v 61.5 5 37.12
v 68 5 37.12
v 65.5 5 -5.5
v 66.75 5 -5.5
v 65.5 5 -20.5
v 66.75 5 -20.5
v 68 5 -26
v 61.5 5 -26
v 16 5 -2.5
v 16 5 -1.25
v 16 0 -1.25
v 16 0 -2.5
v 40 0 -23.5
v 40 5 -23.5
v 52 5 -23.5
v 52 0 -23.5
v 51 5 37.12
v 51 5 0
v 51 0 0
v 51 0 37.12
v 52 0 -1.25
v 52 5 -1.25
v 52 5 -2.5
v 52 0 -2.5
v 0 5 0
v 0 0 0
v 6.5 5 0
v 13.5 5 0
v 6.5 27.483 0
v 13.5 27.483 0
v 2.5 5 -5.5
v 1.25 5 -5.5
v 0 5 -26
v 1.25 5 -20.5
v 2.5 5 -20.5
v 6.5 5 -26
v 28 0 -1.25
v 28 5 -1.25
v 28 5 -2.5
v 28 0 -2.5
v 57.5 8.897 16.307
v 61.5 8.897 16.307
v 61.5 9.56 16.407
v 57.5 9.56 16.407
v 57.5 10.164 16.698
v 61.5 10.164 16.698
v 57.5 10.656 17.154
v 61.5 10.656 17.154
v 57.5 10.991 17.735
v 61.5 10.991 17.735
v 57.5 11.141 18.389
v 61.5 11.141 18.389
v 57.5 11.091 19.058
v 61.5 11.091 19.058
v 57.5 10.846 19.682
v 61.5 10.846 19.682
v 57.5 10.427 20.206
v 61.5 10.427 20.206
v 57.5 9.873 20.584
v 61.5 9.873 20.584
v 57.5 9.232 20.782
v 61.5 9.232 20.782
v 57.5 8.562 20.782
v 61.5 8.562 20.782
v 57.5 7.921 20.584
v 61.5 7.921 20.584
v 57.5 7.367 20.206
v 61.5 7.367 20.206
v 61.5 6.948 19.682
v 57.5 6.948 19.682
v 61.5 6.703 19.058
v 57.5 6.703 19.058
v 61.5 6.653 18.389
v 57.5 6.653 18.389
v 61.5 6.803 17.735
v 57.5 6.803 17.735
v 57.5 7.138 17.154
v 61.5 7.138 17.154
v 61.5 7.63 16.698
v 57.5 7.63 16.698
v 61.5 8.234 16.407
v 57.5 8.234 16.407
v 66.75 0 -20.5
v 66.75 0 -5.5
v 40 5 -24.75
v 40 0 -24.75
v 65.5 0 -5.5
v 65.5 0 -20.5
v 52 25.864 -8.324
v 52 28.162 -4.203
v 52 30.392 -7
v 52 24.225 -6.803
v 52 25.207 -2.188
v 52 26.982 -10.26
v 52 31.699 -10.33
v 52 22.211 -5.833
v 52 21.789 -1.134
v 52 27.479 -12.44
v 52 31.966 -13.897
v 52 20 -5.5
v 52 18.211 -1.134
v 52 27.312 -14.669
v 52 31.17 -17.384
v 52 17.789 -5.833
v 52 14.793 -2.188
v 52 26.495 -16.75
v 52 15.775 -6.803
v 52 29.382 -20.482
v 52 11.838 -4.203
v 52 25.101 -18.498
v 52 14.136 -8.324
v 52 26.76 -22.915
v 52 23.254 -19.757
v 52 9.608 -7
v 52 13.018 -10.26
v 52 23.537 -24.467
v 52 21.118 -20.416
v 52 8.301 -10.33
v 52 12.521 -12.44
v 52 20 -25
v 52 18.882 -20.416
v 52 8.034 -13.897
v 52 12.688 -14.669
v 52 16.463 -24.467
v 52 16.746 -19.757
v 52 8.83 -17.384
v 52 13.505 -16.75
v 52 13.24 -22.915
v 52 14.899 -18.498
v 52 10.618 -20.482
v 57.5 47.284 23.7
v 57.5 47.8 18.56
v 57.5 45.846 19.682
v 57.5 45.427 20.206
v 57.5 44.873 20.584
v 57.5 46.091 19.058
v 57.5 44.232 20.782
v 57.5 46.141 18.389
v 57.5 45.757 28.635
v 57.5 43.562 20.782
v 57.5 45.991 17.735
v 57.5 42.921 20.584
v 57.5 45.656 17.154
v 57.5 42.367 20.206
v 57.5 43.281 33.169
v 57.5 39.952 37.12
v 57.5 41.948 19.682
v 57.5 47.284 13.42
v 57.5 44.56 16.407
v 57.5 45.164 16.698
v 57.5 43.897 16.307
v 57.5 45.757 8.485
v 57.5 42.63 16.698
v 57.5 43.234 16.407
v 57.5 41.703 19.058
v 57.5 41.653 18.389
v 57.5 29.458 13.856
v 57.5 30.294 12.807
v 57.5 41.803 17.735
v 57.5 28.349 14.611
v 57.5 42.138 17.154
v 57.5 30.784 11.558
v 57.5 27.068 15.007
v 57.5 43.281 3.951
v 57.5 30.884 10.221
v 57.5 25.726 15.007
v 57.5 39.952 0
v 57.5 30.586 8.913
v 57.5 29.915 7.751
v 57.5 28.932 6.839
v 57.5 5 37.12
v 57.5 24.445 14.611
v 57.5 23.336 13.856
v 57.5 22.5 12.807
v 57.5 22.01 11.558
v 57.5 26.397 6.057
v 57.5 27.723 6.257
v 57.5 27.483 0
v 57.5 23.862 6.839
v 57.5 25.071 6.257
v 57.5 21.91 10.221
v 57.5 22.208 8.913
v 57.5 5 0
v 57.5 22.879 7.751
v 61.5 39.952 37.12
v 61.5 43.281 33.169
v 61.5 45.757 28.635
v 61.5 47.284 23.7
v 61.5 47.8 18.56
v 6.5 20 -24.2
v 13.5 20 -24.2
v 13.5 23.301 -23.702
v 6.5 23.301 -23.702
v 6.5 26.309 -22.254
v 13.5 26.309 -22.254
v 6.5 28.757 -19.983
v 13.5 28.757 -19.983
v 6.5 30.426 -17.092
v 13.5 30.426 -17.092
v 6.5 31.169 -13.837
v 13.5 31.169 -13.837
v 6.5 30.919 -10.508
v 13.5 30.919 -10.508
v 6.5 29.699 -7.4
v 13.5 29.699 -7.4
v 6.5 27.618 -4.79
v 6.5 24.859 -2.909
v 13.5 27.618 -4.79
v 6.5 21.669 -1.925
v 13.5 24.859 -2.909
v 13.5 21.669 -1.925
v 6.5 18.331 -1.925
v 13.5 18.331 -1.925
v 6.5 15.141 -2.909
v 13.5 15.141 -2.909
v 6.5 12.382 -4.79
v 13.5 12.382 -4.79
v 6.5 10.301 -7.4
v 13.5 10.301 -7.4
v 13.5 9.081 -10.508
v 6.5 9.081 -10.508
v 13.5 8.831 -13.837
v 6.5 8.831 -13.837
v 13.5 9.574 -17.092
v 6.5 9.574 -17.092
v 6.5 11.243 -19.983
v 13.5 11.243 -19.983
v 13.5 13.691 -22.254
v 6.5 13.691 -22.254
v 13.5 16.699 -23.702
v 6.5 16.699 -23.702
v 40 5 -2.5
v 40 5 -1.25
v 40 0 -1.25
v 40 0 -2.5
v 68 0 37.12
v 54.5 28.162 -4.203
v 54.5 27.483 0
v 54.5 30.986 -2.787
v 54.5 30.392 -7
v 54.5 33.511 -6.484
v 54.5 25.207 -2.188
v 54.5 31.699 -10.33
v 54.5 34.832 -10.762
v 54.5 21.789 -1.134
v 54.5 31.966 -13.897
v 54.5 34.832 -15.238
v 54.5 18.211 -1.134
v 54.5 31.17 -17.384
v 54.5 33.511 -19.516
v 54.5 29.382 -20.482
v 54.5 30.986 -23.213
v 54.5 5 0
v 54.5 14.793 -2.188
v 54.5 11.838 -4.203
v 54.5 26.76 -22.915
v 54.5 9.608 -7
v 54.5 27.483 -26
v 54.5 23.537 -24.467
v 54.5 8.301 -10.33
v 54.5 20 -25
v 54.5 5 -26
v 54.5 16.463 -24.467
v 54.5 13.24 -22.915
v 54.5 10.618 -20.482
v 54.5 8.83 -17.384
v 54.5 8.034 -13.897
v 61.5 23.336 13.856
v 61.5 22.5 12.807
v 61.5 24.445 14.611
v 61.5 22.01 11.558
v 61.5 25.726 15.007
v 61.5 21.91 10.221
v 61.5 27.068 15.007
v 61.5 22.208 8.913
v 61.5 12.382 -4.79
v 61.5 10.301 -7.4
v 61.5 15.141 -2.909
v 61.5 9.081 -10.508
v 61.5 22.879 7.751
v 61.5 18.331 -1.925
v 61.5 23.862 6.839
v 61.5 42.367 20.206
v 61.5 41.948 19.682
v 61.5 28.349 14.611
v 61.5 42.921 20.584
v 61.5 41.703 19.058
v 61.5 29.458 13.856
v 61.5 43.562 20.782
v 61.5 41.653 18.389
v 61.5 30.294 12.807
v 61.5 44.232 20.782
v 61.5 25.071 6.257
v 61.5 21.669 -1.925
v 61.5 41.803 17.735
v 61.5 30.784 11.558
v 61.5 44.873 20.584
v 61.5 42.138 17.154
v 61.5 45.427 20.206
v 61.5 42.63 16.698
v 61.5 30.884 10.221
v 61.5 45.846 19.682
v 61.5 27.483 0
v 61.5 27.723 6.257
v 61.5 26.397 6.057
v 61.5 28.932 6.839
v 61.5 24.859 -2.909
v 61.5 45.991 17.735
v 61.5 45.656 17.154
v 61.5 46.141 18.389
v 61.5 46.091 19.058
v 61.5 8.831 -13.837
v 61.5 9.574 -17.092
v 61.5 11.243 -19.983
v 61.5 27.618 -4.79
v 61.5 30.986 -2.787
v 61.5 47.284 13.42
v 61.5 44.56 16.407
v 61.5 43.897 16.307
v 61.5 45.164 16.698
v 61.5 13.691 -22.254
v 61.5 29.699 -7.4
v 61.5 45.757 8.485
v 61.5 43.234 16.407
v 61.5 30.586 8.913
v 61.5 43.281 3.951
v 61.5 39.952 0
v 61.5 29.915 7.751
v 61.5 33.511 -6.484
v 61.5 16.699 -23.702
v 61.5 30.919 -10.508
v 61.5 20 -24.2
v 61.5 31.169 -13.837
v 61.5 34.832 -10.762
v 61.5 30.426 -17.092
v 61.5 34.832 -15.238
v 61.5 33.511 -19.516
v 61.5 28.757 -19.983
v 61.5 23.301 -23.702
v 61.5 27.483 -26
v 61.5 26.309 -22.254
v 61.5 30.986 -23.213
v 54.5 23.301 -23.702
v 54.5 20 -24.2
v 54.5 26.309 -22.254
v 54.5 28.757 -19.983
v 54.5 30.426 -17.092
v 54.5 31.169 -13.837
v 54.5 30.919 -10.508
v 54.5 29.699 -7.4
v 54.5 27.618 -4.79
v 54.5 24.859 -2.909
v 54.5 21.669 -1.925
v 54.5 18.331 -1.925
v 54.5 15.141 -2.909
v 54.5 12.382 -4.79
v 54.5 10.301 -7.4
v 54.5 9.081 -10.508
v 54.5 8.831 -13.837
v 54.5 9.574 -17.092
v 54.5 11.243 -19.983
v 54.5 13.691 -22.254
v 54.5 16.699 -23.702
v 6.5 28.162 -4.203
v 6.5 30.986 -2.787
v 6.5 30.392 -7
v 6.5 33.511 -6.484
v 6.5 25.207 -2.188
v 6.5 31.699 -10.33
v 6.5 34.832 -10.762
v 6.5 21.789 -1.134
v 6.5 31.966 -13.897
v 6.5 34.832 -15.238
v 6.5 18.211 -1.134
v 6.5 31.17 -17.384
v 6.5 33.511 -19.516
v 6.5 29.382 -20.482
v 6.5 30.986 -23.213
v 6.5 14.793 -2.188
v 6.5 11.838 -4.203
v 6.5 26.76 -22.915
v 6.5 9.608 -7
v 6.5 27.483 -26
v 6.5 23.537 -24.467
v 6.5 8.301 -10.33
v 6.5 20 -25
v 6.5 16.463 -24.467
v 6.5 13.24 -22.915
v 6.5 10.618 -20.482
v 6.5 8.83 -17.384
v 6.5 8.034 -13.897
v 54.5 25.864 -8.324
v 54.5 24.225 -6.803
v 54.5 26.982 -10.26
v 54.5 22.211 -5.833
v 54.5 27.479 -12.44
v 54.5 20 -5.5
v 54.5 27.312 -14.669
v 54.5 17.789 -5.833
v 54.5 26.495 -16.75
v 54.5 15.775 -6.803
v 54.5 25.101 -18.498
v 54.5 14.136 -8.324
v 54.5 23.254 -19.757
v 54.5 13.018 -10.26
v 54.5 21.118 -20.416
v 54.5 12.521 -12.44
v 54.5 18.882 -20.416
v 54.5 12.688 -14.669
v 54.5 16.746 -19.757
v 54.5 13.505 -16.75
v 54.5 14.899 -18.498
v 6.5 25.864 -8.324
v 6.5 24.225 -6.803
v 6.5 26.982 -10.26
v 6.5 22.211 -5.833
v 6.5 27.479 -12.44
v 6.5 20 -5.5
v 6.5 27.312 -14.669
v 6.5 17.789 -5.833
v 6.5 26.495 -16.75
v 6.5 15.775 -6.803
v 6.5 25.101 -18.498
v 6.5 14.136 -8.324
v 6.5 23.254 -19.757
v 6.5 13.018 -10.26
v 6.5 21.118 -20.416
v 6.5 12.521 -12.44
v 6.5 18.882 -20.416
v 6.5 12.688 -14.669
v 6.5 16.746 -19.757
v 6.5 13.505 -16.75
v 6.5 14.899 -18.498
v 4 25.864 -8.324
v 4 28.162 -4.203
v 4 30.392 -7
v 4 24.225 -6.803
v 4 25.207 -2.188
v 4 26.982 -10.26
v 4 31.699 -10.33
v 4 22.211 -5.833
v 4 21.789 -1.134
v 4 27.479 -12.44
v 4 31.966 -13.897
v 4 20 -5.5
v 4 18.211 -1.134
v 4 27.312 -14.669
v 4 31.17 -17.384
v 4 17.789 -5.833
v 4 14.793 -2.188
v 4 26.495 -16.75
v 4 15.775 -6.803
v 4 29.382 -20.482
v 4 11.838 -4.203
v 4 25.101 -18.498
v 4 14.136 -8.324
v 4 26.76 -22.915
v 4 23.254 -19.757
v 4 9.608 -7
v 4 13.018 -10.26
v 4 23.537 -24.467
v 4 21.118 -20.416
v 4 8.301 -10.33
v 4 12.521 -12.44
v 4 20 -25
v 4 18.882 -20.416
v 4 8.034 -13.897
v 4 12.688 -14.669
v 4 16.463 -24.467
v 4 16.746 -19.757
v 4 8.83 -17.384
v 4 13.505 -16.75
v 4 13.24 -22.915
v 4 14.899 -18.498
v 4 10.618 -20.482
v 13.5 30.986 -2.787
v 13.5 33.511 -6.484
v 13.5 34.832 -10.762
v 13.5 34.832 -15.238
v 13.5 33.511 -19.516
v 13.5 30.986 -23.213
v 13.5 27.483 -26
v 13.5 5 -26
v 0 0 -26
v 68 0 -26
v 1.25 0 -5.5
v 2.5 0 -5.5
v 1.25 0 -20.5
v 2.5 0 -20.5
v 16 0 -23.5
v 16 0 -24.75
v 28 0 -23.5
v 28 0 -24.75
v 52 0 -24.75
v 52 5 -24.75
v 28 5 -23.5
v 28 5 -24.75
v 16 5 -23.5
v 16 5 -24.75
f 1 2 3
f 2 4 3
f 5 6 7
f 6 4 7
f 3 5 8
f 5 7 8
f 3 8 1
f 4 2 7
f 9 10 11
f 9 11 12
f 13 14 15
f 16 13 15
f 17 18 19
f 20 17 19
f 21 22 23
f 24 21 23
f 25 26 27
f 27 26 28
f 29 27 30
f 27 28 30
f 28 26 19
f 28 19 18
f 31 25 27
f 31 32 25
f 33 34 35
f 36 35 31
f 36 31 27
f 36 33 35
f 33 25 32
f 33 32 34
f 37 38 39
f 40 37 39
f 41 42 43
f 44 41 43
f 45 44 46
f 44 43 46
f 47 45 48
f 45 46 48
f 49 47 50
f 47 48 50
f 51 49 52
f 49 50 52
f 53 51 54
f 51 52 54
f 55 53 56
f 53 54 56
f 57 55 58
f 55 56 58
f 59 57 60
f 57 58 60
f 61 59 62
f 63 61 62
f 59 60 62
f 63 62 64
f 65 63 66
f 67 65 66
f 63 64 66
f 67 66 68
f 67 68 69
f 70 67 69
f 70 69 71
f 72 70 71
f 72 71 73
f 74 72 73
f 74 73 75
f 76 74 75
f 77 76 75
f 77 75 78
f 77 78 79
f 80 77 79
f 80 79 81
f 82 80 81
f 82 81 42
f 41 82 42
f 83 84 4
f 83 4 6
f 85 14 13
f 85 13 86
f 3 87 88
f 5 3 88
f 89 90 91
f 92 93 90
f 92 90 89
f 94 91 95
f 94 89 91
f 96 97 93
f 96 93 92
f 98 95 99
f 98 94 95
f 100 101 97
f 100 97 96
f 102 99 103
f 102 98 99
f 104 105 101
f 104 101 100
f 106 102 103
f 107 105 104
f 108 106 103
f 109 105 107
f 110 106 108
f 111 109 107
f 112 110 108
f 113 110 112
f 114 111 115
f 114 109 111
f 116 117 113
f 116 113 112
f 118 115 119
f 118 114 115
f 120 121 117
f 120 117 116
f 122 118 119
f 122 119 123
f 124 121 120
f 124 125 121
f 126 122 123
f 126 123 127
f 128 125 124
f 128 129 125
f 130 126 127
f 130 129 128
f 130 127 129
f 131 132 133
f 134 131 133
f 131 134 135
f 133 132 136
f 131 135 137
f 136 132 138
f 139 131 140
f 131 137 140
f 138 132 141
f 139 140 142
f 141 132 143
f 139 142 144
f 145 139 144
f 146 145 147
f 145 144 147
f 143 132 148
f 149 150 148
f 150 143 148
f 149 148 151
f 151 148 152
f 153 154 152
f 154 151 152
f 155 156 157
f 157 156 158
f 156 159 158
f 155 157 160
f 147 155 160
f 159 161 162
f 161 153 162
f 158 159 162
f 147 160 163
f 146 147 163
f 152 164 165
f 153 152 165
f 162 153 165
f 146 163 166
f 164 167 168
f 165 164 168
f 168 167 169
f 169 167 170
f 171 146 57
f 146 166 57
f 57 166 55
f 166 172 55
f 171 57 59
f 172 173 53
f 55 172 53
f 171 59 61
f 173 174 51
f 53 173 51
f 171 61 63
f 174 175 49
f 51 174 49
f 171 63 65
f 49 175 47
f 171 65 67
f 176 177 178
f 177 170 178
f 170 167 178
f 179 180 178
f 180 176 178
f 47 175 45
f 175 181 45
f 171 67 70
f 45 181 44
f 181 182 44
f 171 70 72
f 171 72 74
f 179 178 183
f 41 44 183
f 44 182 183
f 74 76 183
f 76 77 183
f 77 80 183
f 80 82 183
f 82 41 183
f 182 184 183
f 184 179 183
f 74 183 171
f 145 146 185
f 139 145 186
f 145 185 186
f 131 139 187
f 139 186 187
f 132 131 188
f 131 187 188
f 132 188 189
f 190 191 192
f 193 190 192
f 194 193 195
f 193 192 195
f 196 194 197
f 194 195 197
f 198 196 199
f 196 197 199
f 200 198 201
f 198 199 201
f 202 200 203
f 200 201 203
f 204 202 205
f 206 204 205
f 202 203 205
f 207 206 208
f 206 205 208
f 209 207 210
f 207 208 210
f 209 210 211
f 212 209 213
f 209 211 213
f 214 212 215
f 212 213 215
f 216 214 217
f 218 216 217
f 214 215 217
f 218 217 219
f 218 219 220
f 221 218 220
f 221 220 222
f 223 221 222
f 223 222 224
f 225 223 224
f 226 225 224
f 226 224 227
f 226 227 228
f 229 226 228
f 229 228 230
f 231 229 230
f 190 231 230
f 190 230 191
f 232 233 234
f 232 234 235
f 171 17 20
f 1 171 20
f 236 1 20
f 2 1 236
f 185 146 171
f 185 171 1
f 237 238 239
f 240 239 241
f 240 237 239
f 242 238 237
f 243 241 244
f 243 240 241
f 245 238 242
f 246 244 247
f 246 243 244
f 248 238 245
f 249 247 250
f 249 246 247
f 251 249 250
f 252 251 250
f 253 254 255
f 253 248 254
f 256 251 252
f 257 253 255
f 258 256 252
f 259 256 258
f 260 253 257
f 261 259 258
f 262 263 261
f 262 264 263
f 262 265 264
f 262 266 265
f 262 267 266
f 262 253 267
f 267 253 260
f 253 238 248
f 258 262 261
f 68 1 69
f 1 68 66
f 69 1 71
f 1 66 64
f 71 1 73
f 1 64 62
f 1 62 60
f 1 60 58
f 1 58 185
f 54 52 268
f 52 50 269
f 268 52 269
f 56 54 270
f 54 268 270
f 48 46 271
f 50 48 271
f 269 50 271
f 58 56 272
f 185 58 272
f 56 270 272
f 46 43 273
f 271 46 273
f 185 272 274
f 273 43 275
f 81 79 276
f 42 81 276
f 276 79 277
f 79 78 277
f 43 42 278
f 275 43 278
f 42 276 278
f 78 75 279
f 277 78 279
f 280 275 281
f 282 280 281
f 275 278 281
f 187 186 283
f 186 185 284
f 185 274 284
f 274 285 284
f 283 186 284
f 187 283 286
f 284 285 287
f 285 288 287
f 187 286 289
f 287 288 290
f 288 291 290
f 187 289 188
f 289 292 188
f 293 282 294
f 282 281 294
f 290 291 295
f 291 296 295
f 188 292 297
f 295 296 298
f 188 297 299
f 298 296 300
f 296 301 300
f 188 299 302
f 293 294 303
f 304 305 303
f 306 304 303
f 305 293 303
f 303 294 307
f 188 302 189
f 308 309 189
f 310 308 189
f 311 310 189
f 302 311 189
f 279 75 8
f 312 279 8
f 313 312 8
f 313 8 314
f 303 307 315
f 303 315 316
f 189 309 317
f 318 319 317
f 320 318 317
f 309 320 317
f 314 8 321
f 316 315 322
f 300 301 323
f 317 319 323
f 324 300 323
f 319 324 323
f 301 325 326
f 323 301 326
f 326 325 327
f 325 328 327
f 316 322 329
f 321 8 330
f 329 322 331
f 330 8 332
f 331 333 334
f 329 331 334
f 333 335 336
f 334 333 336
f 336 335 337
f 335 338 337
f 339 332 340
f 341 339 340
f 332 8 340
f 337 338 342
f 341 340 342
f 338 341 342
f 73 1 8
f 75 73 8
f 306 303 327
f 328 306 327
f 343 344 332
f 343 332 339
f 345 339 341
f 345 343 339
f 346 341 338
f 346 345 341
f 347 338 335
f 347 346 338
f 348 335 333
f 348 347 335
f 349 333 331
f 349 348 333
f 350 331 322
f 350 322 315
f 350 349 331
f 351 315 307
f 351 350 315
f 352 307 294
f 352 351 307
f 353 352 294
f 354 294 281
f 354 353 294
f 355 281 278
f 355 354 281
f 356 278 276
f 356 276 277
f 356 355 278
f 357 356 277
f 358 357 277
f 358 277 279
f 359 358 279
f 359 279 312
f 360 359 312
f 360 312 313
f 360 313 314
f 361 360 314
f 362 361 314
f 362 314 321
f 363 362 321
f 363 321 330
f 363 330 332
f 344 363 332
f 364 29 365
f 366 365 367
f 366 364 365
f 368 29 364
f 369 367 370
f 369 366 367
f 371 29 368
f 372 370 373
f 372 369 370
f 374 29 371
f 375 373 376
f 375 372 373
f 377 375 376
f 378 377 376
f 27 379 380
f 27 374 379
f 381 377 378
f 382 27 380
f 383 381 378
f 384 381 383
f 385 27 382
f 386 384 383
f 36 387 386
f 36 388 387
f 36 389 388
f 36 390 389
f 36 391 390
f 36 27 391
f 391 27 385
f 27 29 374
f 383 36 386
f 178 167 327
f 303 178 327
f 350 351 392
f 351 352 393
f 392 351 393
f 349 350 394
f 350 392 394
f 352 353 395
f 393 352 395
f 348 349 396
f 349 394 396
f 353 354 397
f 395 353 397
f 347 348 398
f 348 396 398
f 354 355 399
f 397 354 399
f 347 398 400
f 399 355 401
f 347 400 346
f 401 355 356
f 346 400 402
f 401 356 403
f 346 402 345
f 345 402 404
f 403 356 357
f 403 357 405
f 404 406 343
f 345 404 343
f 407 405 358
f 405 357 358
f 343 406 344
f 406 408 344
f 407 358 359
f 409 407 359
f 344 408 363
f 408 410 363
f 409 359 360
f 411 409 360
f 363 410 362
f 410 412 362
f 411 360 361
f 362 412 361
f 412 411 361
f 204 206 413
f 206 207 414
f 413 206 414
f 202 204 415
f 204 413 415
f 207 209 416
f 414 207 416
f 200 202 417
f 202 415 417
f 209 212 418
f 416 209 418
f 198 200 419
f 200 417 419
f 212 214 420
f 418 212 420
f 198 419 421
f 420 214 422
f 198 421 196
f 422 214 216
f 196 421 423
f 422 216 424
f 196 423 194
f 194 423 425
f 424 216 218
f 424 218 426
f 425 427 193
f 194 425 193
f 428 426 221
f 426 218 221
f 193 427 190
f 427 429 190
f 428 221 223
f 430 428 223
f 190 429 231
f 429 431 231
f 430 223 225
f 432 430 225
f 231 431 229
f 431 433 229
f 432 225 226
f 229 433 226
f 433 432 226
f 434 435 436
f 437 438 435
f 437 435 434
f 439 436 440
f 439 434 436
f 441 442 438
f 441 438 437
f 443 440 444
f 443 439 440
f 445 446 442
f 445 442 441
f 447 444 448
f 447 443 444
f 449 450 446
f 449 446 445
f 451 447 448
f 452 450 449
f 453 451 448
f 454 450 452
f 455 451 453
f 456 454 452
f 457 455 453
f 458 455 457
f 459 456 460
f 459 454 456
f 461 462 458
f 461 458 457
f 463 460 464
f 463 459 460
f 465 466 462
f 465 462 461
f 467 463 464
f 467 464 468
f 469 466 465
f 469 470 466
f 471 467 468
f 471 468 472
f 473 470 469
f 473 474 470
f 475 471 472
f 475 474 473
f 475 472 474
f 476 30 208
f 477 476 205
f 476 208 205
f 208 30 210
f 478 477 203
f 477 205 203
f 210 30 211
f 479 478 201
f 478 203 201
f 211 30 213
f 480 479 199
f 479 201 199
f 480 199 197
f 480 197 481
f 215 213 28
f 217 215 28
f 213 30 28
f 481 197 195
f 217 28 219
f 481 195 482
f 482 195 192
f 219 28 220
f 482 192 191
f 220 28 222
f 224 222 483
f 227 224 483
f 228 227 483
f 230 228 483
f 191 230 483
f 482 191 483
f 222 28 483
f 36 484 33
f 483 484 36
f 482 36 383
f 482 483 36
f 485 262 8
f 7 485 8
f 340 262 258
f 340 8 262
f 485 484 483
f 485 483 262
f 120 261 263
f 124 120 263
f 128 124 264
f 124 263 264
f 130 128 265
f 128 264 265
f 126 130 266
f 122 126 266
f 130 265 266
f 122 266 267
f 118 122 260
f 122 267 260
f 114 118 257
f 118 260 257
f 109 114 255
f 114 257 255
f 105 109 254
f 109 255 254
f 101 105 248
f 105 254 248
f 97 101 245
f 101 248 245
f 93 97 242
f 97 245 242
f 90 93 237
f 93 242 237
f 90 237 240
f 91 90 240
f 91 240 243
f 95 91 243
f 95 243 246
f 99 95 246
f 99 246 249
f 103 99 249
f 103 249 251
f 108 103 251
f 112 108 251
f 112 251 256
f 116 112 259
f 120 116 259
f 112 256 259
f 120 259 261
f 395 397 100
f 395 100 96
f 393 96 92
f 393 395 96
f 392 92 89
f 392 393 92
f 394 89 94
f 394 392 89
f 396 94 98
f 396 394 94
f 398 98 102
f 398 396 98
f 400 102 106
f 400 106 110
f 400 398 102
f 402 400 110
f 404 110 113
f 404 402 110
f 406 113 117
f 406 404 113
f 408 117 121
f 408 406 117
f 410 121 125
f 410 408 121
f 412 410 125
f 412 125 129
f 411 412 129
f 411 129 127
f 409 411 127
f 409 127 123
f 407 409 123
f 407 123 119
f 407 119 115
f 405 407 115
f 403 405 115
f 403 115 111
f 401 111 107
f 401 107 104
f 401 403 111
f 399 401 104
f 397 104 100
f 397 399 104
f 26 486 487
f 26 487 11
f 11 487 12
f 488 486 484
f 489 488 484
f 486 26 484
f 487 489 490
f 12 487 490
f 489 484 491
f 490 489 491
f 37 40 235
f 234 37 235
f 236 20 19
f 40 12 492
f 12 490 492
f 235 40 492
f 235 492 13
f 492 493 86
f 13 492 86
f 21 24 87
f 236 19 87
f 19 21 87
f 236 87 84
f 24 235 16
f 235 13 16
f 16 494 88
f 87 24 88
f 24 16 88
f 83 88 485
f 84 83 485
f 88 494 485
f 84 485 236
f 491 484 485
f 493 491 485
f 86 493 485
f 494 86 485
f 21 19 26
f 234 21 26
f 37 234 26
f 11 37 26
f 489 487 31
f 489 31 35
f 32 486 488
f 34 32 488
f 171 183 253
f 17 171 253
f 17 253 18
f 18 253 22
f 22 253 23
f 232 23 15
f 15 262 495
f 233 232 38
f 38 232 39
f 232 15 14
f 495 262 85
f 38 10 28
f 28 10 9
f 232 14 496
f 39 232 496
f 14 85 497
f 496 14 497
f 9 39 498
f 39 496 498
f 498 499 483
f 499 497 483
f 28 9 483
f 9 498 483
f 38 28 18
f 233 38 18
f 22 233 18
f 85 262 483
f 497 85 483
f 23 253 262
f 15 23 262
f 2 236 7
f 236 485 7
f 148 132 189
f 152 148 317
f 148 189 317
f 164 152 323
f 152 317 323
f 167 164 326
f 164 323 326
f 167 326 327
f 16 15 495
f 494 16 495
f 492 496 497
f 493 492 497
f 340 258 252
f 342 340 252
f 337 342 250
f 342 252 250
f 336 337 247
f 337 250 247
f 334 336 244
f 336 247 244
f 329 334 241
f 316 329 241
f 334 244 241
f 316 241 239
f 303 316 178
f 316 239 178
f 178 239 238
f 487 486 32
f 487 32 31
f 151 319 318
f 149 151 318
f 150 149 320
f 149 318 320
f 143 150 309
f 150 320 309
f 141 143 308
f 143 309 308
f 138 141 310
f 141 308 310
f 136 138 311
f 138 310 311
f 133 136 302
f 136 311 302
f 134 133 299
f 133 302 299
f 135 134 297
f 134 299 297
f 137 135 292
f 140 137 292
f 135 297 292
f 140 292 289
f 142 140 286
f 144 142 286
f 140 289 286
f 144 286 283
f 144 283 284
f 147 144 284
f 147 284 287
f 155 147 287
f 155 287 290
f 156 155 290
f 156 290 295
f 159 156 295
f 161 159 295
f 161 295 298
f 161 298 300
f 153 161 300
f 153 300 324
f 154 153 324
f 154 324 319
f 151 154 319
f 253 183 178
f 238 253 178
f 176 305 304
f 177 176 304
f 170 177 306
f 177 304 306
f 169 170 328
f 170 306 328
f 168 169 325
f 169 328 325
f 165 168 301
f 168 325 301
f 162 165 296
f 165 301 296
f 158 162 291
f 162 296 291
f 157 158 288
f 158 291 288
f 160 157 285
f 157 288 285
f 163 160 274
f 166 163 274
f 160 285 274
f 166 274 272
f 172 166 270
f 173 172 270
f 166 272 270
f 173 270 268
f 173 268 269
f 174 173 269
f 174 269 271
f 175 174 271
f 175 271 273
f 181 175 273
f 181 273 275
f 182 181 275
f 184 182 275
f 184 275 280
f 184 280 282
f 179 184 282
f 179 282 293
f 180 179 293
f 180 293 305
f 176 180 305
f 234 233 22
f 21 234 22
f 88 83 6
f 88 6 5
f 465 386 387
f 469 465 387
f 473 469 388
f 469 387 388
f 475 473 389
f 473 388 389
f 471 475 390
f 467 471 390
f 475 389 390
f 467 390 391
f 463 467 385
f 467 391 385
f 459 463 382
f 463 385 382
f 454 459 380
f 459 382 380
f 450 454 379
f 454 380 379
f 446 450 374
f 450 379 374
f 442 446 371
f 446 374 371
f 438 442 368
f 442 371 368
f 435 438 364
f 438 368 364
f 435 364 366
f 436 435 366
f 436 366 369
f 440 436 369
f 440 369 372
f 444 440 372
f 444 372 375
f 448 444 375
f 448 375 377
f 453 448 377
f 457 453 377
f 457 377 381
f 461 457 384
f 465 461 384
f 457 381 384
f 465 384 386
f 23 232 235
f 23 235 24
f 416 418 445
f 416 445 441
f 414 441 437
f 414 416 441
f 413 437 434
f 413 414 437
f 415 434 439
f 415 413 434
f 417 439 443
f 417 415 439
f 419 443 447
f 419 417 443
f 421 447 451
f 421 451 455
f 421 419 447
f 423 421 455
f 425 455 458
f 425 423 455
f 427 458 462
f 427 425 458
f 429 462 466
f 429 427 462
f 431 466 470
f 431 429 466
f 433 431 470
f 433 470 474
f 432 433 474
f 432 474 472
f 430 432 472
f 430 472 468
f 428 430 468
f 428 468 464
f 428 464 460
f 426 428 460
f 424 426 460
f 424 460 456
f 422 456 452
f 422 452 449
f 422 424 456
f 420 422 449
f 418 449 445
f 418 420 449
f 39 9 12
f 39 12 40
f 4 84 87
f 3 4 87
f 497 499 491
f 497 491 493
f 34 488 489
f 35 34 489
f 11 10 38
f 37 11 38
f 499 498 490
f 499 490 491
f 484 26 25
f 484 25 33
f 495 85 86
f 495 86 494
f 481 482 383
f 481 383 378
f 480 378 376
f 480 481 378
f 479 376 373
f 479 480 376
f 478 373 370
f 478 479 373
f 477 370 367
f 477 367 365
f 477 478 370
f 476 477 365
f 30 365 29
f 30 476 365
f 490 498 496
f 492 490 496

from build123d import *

# Parameters (mm, degrees)
SKETCH1_W            = 20
SKETCH1_H            = 26
SKETCH1_W_2          = 1.25
SKETCH1_H_2          = 15
BOSS_EXTRUDE5_DEPTH  = 5
SKETCH3_W            = 7
SKETCH3_H            = 26
BOSS_EXTRUDE6_DEPTH  = 40
CUT_EXTRUDE1_REACH   = 55.696
SKETCH5_R            = 11.2
SKETCH6_W            = 26
SKETCH6_H            = 5
BOSS_EXTRUDE8_DEPTH  = 14
SKETCH8_R            = 12
SKETCH8_R_2          = 7.5
BOSS_EXTRUDE9_DEPTH  = 2.5
SKETCH9_R            = 12
SKETCH9_R_2          = 7.5
BOSS_EXTRUDE10_DEPTH = 2.5
SKETCH7_W            = 12
SKETCH7_H            = 1.25
CUT_EXTRUDE2_DEPTH   = 10
BOSS_EXTRUDE11_DEPTH = 37.12
SKETCH14_R           = 2.25
SKETCH14_R_2         = 4.5
CUT_EXTRUDE4_DEPTH   = 10


with BuildPart() as part:
    # Sketch1 → Boss-Extrude5 (new body)
    with BuildSketch(Plane(origin=(0, 0, 0), x_dir=(1, 0, 0), z_dir=(0, 1, 0))):
        with Locations((10, 13)):
            Rectangle(SKETCH1_W, SKETCH1_H)
        with Locations((1.875, 13)):
            Rectangle(SKETCH1_W_2, SKETCH1_H_2, mode=Mode.SUBTRACT)
    boss_extrude5 = extrude(amount=BOSS_EXTRUDE5_DEPTH)

    # Sketch3 → Boss-Extrude6 (add)
    with BuildSketch(Plane(origin=(0, 5, 0), x_dir=(1, 0, 0), z_dir=(0, 1, 0))):
        with Locations((10, 13)):
            Rectangle(SKETCH3_W, SKETCH3_H)
    boss_extrude6 = extrude(amount=BOSS_EXTRUDE6_DEPTH)

    # Sketch5 → Cut-Extrude1 (cut, up to next)
    with BuildSketch(Plane(origin=(13.5, 0, 0), x_dir=(0, 0, -1), z_dir=(1, 0, 0)), mode=Mode.PRIVATE) as cut_extrude1_sk1:
        with Locations((13, 20)):
            Circle(SKETCH5_R)
    cut_extrude1_tool1 = extrude(cut_extrude1_sk1.sketch, amount=-CUT_EXTRUDE1_REACH, mode=Mode.PRIVATE) & part.part
    # Sketch5 → Cut-Extrude1 (cut, up to next)
    with BuildSketch(Plane(origin=(13.5, 0, 0), x_dir=(0, 0, -1), z_dir=(1, 0, 0)), mode=Mode.PRIVATE) as cut_extrude1_sk2:
        with BuildLine():
            Line((0, 27.483314774), (0, 45))
            Line((0, 45), (26, 45))
            Line((26, 45), (26, 27.483314774))
            ThreePointArc((26, 27.483314774), (13, 35), (0, 27.483314774))
        make_face()
    cut_extrude1_tool2 = extrude(cut_extrude1_sk2.sketch, amount=-CUT_EXTRUDE1_REACH, mode=Mode.PRIVATE) & part.part
    cut_extrude1_1 = cut_extrude1_tool1.solids().sort_by_distance((13.5, 20, -13))[0]
    add(cut_extrude1_1, mode=Mode.SUBTRACT)
    cut_extrude1_2 = cut_extrude1_tool2.solids().sort_by_distance((13.5, 38.725293, -13))[0]
    add(cut_extrude1_2, mode=Mode.SUBTRACT)
    cut_extrude1 = cut_extrude1_1 + cut_extrude1_2  # Cut-Extrude1 as one shape, for the pattern or mirror that repeats it

    # Sketch6 → Boss-Extrude8 (add)
    with BuildSketch(Plane(origin=(20, 0, 0), x_dir=(0, 0, -1), z_dir=(1, 0, 0))):
        with Locations((13, 2.5)):
            Rectangle(SKETCH6_W, SKETCH6_H)
    boss_extrude8 = extrude(amount=BOSS_EXTRUDE8_DEPTH)

    # Mirror5: Boss-Extrude5, Boss-Extrude6, Cut-Extrude1, Boss-Extrude8 across plane
    add(boss_extrude5.mirror(Plane.ZY.offset(-34)))
    add(boss_extrude6.mirror(Plane.ZY.offset(-34)))
    add(cut_extrude1.mirror(Plane.ZY.offset(-34)), mode=Mode.SUBTRACT)
    add(boss_extrude8.mirror(Plane.ZY.offset(-34)))

    # Sketch8 → Boss-Extrude9 (add)
    with BuildSketch(Plane.ZY.offset(-6.5)):
        with Locations(Location((-13, 20, 0), (0, 0, 180))):
            Circle(SKETCH8_R)
        with Locations((-13, 20)):
            Circle(SKETCH8_R_2, mode=Mode.SUBTRACT)
    extrude(amount=BOSS_EXTRUDE9_DEPTH)

    # Sketch9 → Boss-Extrude10 (add)
    with BuildSketch(Plane.ZY.offset(-54.5)):
        with Locations(Location((-13, 20, 0), (0, 0, 180))):
            Circle(SKETCH9_R)
        with Locations((-13, 20)):
            Circle(SKETCH9_R_2, mode=Mode.SUBTRACT)
    extrude(amount=BOSS_EXTRUDE10_DEPTH)

    # Sketch7 → Cut-Extrude2 (cut)
    with BuildSketch(Plane(origin=(0, 5, 0), x_dir=(1, 0, 0), z_dir=(0, 1, 0))):
        with Locations((22, 1.875)):
            Rectangle(SKETCH7_W, SKETCH7_H)
        with Locations((46, 1.875)):
            Rectangle(SKETCH7_W, SKETCH7_H)
        with Locations((46, 24.125)):
            Rectangle(SKETCH7_W, SKETCH7_H)
        with Locations((22, 24.125)):
            Rectangle(SKETCH7_W, SKETCH7_H)
    extrude(amount=-CUT_EXTRUDE2_DEPTH, mode=Mode.SUBTRACT)

    # Sketch10 → Boss-Extrude11 (add)
    with BuildSketch(Plane.XY):
        Polygon((51, 0), (68, 0), (68, 5), (61.5, 5), (61.5, 47.8), (57.5, 47.8), (57.5, 5), (51, 5), align=None)
    extrude(amount=BOSS_EXTRUDE11_DEPTH)

    # Sketch14 → Cut-Extrude4 (cut)
    with BuildSketch(Plane(origin=(61.5, 0, 0), x_dir=(0, 0, -1), z_dir=(1, 0, 0))):
        Polygon((-37.12, 51.83243557), (-37.12, 47.8), (-18.56, 47.8), (0, 47.8), (0, 51.83243557), align=None)
        with BuildLine():
            Line((0, 47.8), (-18.56, 47.8))
            ThreePointArc((-18.56, 47.8), (-8.484558377, 45.75747818), (0, 39.952421039))
            Line((0, 39.952421039), (0, 47.8))
        make_face()
        with BuildLine():
            Line((-37.12, 47.8), (-37.12, 39.952421039))
            ThreePointArc((-37.12, 39.952421039), (-28.635441623, 45.75747818), (-18.56, 47.8))
            Line((-18.56, 47.8), (-37.12, 47.8))
        make_face()
        with Locations((-18.556883399, 43.896979327)):
            Circle(SKETCH14_R)
        with Locations((-10.556883399, 26.396979327)):
            Circle(SKETCH14_R_2)
        with Locations((-18.556883399, 8.896979327)):
            Circle(SKETCH14_R)
    extrude(amount=-CUT_EXTRUDE4_DEPTH, mode=Mode.SUBTRACT)


solid = part.part
